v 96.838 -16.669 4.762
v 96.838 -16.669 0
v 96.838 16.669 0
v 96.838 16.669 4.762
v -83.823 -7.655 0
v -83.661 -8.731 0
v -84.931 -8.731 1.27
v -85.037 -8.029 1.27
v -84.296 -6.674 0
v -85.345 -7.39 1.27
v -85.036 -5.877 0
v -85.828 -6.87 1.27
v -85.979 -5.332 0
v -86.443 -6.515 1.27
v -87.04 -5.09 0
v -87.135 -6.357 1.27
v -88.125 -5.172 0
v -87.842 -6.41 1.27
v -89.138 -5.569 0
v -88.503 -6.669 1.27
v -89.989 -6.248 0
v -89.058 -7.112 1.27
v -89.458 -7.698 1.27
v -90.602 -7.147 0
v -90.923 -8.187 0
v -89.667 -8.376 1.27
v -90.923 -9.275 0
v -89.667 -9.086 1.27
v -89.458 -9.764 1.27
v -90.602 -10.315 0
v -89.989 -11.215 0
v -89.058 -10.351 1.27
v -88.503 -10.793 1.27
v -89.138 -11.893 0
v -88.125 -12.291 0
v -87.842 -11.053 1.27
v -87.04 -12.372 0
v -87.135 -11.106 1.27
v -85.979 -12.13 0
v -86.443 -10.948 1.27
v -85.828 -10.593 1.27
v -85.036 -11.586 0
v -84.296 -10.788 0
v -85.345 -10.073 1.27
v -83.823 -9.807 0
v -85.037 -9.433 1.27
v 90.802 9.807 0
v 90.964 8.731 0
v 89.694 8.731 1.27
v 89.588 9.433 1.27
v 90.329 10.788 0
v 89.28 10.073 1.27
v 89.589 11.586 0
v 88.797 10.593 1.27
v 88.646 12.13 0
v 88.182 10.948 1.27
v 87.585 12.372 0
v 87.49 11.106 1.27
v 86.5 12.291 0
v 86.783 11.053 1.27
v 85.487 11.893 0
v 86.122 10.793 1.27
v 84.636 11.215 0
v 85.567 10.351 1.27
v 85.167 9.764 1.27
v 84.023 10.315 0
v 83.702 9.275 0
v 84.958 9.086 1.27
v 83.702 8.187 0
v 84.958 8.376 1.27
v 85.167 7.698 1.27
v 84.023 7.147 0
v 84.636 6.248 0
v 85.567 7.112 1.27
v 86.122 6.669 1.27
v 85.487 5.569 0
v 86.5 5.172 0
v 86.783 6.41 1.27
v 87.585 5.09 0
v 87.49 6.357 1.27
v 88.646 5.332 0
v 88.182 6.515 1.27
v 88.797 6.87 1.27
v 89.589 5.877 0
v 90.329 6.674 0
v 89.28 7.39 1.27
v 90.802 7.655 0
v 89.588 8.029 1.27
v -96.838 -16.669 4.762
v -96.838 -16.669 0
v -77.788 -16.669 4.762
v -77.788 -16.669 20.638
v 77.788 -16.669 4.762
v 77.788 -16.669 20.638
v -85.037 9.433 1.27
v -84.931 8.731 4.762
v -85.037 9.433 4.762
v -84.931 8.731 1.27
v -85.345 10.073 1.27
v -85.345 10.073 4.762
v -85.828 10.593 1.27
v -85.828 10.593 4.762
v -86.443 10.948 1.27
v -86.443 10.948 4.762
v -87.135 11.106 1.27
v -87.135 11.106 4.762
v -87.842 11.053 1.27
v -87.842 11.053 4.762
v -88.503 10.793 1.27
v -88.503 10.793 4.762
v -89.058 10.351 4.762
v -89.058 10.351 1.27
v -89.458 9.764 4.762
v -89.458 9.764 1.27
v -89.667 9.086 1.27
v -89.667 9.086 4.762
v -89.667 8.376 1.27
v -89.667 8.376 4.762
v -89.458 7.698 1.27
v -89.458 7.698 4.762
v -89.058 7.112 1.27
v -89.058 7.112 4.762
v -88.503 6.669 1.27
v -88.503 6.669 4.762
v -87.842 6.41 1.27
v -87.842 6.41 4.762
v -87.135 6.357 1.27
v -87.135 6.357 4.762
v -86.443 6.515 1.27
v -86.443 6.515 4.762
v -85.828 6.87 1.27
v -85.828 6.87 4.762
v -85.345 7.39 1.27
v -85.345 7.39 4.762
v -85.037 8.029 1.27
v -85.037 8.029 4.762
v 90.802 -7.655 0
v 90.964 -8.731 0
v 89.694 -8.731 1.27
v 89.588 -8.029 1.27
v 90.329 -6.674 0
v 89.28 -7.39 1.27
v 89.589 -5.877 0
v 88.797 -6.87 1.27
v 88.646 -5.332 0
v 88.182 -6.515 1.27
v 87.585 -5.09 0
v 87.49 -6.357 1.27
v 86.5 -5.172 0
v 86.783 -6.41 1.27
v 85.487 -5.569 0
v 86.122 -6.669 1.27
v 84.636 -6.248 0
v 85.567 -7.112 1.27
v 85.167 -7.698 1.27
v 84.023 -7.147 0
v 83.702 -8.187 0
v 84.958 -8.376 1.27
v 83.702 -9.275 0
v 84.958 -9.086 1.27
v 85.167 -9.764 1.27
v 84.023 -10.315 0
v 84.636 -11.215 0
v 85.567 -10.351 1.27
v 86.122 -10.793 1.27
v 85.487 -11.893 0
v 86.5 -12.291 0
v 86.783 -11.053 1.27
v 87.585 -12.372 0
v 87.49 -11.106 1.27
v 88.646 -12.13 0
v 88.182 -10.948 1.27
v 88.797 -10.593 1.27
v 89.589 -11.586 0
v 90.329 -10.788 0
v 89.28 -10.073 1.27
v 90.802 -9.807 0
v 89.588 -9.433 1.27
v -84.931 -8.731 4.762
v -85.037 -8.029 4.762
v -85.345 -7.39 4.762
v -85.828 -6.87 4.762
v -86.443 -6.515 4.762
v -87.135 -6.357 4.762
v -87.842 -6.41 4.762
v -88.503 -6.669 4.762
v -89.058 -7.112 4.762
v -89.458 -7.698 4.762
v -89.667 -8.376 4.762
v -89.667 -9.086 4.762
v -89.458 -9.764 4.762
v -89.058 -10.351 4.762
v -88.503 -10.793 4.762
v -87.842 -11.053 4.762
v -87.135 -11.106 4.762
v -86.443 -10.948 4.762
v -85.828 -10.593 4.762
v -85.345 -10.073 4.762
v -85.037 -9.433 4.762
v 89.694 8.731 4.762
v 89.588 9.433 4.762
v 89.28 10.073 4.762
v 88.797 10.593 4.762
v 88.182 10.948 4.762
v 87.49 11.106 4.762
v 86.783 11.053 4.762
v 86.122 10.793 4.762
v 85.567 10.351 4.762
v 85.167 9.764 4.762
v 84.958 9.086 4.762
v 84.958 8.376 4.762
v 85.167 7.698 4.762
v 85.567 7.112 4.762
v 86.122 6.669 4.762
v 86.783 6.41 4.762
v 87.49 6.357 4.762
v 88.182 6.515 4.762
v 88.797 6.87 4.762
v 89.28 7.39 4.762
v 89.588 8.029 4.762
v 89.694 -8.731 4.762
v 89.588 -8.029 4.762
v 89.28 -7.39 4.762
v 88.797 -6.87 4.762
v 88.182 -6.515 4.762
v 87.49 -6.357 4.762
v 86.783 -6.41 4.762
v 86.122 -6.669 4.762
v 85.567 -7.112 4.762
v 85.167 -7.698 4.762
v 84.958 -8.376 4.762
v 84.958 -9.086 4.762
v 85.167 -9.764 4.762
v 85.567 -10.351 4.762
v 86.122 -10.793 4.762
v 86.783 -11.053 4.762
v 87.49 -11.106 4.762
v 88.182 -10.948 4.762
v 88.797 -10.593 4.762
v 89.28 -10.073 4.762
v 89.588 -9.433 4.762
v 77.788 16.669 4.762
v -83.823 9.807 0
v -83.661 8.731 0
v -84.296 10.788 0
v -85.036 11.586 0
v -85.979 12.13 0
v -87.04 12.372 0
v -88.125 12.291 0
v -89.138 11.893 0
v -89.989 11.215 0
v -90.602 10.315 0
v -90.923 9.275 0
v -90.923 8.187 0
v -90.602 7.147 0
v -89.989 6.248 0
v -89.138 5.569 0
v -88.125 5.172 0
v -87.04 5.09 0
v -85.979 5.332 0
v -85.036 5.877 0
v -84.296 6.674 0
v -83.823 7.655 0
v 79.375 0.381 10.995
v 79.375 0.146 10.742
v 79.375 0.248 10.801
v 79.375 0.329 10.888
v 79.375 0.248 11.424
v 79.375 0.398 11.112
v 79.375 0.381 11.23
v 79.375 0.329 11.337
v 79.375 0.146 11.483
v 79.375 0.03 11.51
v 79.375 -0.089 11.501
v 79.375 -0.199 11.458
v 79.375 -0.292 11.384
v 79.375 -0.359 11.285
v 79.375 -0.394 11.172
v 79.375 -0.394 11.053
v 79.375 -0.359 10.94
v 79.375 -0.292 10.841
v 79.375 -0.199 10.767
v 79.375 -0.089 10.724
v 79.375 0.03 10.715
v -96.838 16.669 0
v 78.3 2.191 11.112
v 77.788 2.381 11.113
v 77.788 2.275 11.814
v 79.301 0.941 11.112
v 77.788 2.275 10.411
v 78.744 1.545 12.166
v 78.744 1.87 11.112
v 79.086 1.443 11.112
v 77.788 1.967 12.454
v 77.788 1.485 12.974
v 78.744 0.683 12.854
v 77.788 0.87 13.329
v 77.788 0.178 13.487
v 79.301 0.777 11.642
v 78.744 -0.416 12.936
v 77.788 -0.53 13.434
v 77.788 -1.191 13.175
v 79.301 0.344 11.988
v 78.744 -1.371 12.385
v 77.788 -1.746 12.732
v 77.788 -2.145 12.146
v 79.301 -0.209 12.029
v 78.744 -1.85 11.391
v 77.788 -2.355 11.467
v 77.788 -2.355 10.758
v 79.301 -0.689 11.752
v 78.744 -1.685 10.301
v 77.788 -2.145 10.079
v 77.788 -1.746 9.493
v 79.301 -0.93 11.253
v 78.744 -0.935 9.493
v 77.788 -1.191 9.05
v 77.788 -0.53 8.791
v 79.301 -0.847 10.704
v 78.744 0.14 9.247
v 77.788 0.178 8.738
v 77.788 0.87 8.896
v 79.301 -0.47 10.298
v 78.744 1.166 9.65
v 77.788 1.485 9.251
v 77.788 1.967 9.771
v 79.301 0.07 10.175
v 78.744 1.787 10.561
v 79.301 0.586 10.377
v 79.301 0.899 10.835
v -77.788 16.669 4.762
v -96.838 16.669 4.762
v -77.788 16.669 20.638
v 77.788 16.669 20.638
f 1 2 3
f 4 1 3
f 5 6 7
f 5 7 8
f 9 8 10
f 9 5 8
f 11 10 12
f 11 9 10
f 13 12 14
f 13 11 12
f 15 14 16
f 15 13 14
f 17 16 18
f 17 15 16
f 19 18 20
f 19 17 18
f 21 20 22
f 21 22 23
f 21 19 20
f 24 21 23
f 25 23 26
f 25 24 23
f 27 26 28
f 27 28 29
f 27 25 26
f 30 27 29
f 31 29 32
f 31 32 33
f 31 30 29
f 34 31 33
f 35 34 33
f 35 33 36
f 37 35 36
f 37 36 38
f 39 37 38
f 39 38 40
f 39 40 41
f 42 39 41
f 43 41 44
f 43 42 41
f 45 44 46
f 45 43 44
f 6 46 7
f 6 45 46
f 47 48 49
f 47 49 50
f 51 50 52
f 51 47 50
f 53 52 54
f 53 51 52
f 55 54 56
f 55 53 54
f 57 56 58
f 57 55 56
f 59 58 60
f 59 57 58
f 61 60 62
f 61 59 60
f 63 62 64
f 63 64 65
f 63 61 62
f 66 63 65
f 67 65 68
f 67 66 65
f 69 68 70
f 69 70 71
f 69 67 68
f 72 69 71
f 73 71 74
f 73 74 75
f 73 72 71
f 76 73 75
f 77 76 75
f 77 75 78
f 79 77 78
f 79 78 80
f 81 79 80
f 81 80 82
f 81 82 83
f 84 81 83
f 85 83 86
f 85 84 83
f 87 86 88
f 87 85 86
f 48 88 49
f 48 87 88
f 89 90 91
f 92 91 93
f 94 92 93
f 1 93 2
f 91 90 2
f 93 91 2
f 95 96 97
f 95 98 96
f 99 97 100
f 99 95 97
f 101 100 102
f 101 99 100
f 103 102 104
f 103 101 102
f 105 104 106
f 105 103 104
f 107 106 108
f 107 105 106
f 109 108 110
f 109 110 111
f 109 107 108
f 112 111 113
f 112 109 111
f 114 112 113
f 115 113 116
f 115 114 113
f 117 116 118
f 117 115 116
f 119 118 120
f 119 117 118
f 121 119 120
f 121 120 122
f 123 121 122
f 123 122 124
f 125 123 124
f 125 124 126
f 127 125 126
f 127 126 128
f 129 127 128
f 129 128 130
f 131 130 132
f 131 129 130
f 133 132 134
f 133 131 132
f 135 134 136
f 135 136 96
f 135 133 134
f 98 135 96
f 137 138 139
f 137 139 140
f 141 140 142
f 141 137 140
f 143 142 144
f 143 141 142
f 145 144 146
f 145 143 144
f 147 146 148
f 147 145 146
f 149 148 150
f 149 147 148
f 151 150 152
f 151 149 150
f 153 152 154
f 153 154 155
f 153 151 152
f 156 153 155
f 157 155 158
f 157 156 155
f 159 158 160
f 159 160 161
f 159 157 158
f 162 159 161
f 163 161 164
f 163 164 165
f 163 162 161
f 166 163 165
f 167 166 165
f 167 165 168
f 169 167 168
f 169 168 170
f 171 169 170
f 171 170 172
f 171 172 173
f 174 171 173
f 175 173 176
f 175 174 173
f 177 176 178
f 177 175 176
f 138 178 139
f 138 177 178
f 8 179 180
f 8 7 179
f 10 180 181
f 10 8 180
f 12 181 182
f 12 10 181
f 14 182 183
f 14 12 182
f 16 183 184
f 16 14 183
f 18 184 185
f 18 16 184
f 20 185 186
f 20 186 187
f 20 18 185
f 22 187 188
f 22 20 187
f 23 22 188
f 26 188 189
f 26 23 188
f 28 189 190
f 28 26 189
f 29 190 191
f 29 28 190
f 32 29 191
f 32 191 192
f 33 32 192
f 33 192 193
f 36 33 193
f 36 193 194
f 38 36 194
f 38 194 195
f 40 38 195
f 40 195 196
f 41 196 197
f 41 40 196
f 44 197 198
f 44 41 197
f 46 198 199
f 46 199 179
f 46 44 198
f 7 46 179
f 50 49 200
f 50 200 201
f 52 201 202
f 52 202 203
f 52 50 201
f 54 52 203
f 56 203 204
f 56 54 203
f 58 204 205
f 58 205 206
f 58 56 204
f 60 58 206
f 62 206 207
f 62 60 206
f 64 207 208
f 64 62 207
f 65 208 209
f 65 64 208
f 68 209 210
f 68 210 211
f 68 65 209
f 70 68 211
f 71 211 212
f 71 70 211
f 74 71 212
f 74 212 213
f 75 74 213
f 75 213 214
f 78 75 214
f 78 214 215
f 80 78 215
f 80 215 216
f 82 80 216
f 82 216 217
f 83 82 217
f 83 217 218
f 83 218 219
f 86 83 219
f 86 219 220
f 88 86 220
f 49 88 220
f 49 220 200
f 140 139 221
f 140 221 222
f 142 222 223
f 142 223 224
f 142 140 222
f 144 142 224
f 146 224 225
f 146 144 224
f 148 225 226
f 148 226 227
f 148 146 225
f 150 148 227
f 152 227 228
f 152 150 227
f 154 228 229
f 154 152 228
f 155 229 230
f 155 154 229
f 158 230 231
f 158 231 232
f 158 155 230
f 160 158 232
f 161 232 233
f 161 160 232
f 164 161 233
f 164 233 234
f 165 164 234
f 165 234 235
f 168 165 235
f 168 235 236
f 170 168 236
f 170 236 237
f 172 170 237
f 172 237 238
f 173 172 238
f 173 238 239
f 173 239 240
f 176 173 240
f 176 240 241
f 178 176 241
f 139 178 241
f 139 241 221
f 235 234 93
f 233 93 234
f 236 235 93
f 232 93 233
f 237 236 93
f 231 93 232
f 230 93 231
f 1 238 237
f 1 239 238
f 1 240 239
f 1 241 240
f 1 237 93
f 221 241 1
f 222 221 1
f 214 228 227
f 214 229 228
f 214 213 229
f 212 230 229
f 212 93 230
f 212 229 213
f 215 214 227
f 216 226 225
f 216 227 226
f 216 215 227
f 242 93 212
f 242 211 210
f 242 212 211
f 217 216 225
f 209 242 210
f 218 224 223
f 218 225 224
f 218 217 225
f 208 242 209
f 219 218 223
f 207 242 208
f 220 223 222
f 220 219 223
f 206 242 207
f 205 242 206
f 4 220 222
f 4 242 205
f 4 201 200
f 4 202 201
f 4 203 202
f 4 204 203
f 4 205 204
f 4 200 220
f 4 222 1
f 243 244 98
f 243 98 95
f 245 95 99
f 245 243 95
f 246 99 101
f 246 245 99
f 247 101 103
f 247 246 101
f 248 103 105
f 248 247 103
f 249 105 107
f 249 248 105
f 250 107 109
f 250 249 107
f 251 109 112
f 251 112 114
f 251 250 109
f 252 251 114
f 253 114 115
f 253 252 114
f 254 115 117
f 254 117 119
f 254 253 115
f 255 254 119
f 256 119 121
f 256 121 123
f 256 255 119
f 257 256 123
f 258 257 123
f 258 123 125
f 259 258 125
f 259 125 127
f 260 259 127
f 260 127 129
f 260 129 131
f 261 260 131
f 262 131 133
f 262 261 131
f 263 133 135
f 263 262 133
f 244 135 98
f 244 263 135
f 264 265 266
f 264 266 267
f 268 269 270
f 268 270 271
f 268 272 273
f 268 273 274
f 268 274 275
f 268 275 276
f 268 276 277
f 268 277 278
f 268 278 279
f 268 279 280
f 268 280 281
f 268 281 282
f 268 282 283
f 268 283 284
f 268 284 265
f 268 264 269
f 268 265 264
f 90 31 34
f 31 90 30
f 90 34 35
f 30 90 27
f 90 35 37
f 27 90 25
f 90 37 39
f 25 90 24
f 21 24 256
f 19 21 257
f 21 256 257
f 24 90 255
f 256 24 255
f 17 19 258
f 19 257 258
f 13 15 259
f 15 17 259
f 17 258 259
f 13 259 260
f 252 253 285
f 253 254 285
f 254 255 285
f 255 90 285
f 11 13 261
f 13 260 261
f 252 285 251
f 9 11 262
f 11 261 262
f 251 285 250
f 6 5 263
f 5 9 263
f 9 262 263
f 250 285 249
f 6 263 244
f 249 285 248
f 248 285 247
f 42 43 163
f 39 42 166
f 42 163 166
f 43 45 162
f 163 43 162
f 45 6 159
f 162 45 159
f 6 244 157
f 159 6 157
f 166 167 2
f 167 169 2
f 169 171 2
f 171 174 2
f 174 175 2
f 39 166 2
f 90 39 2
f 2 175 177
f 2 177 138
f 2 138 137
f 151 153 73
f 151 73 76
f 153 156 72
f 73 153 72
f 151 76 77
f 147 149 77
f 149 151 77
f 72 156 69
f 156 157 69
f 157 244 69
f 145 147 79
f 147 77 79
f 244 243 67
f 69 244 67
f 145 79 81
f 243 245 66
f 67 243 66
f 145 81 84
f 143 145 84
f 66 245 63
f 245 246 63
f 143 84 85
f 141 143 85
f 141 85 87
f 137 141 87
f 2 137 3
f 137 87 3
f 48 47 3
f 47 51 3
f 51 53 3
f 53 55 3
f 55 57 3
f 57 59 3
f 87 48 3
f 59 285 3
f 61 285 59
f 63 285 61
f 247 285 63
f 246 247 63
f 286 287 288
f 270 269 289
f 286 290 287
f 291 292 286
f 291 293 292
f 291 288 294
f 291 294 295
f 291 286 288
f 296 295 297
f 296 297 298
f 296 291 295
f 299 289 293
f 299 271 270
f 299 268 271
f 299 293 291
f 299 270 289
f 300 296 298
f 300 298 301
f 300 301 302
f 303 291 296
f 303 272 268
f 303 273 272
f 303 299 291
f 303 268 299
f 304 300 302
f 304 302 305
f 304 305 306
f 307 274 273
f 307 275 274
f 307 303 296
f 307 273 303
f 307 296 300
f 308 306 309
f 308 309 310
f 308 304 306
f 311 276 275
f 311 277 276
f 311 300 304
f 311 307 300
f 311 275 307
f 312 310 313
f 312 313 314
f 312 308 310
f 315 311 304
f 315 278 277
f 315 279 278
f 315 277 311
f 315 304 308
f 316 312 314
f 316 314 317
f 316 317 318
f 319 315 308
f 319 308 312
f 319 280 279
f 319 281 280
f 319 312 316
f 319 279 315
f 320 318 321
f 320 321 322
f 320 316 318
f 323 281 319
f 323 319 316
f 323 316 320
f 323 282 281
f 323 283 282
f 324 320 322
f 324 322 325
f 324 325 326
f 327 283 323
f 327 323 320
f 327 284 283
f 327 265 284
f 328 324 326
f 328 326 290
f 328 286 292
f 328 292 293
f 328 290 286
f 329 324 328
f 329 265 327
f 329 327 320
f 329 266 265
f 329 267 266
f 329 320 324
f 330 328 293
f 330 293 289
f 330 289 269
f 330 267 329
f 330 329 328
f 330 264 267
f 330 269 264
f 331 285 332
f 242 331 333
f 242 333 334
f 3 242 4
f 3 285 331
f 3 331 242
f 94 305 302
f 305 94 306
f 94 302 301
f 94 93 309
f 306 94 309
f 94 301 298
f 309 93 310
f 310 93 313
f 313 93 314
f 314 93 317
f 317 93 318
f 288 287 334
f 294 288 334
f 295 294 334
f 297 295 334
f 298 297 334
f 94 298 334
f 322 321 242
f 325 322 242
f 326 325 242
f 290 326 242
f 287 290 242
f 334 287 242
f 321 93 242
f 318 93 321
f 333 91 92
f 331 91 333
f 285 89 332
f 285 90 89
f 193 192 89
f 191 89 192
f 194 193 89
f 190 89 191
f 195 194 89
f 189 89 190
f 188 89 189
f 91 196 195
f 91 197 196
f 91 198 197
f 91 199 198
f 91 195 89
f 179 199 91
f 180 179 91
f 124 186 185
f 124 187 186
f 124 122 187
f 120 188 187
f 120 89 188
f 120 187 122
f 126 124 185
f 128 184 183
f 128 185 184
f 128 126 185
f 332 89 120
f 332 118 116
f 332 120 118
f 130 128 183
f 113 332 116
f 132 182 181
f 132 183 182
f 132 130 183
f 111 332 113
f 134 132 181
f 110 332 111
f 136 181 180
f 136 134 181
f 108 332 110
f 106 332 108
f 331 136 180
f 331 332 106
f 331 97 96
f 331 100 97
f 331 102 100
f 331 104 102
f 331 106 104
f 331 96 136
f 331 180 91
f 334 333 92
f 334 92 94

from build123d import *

# Parameters (mm, degrees)
F0_W     = 155.575
F0_H     = 33.3375
F1_DEPTH = 20.6375
F0_W_2   = 19.05
F0_R     = 2.38125
F2_DEPTH = 1.5875
F3_SIZE  = 1.27
F4_R     = 2.38125
F5_DEPTH = 1.5875
F7_DEPTH = 3.175


# Not quite as in the source:
# - a fillet or chamfer that OpenCascade refuses, or shapes differently, is made with other operations: its cross-section is extruded or revolved along the edge and cut away or added


with BuildPart() as f1:
    # F0 (on Top) → F1 (new body)
    with BuildSketch(Plane.XY):
        Rectangle(F0_W, F0_H)
    extrude(amount=F1_DEPTH)

    # F0 (on Top) → F2 (join)
    with BuildSketch(Plane.XY):
        with Locations((-87.3125, 0)):
            Rectangle(F0_W_2, F0_H)
        with Locations((-87.3125, -8.73125)):
            Circle(F0_R, mode=Mode.SUBTRACT)
        with Locations((-87.3125, 8.73125)):
            Circle(F0_R, mode=Mode.SUBTRACT)
        with Locations((87.3125, 0)):
            Rectangle(F0_W_2, F0_H)
        with Locations((87.3125, -8.73125)):
            Circle(F0_R, mode=Mode.SUBTRACT)
        with Locations((87.3125, 8.73125)):
            Circle(F0_R, mode=Mode.SUBTRACT)
    extrude(amount=F2_DEPTH)

    # F3
    f3_edges = [f1.edges().sort_by_distance(p)[0] for p in [
        (-89.69375, -8.73125, 0),
        (-89.69375, 8.73125, 0),
        (84.93125, -8.73125, 0),
        (84.93125, 8.73125, 0),
    ]]
    chamfer(f3_edges, length=F3_SIZE)

    # F4 (on face) → F5 (join)
    with BuildSketch(Plane.YZ.offset(77.7875)):
        with Locations((0, 11.1125)):
            Circle(F4_R)
    extrude(amount=F5_DEPTH)

    # F6: fillet of radius 2.032 on 1 edges, made by hand

    # F6_s1 → F6_t2 (revolve, cut)
    with BuildSketch(Plane.XY.offset(11.1125)):
        with BuildLine():
            ThreePointArc((77.7875, 2.38125), (78.9292294916, 1.6684631355), (79.375, 0.3984631355))
            Line((79.375, 0.3984631355), (79.375, 2.38125))
            Line((79.375, 2.38125), (77.7875, 2.38125))
        make_face()
    revolve(axis=Axis((79.375, 0, 11.1125), (1, 0, 0)), mode=Mode.SUBTRACT)

    # F7 (add): faces of the model
    f7_faces = [f1.faces().sort_by_distance(p)[0] for p in [
        (-87.3125, 0, 1.5875),
        (87.3125, 0, 1.5875),
    ]]
    extrude(f7_faces, amount=F7_DEPTH)


solid = f1.part
